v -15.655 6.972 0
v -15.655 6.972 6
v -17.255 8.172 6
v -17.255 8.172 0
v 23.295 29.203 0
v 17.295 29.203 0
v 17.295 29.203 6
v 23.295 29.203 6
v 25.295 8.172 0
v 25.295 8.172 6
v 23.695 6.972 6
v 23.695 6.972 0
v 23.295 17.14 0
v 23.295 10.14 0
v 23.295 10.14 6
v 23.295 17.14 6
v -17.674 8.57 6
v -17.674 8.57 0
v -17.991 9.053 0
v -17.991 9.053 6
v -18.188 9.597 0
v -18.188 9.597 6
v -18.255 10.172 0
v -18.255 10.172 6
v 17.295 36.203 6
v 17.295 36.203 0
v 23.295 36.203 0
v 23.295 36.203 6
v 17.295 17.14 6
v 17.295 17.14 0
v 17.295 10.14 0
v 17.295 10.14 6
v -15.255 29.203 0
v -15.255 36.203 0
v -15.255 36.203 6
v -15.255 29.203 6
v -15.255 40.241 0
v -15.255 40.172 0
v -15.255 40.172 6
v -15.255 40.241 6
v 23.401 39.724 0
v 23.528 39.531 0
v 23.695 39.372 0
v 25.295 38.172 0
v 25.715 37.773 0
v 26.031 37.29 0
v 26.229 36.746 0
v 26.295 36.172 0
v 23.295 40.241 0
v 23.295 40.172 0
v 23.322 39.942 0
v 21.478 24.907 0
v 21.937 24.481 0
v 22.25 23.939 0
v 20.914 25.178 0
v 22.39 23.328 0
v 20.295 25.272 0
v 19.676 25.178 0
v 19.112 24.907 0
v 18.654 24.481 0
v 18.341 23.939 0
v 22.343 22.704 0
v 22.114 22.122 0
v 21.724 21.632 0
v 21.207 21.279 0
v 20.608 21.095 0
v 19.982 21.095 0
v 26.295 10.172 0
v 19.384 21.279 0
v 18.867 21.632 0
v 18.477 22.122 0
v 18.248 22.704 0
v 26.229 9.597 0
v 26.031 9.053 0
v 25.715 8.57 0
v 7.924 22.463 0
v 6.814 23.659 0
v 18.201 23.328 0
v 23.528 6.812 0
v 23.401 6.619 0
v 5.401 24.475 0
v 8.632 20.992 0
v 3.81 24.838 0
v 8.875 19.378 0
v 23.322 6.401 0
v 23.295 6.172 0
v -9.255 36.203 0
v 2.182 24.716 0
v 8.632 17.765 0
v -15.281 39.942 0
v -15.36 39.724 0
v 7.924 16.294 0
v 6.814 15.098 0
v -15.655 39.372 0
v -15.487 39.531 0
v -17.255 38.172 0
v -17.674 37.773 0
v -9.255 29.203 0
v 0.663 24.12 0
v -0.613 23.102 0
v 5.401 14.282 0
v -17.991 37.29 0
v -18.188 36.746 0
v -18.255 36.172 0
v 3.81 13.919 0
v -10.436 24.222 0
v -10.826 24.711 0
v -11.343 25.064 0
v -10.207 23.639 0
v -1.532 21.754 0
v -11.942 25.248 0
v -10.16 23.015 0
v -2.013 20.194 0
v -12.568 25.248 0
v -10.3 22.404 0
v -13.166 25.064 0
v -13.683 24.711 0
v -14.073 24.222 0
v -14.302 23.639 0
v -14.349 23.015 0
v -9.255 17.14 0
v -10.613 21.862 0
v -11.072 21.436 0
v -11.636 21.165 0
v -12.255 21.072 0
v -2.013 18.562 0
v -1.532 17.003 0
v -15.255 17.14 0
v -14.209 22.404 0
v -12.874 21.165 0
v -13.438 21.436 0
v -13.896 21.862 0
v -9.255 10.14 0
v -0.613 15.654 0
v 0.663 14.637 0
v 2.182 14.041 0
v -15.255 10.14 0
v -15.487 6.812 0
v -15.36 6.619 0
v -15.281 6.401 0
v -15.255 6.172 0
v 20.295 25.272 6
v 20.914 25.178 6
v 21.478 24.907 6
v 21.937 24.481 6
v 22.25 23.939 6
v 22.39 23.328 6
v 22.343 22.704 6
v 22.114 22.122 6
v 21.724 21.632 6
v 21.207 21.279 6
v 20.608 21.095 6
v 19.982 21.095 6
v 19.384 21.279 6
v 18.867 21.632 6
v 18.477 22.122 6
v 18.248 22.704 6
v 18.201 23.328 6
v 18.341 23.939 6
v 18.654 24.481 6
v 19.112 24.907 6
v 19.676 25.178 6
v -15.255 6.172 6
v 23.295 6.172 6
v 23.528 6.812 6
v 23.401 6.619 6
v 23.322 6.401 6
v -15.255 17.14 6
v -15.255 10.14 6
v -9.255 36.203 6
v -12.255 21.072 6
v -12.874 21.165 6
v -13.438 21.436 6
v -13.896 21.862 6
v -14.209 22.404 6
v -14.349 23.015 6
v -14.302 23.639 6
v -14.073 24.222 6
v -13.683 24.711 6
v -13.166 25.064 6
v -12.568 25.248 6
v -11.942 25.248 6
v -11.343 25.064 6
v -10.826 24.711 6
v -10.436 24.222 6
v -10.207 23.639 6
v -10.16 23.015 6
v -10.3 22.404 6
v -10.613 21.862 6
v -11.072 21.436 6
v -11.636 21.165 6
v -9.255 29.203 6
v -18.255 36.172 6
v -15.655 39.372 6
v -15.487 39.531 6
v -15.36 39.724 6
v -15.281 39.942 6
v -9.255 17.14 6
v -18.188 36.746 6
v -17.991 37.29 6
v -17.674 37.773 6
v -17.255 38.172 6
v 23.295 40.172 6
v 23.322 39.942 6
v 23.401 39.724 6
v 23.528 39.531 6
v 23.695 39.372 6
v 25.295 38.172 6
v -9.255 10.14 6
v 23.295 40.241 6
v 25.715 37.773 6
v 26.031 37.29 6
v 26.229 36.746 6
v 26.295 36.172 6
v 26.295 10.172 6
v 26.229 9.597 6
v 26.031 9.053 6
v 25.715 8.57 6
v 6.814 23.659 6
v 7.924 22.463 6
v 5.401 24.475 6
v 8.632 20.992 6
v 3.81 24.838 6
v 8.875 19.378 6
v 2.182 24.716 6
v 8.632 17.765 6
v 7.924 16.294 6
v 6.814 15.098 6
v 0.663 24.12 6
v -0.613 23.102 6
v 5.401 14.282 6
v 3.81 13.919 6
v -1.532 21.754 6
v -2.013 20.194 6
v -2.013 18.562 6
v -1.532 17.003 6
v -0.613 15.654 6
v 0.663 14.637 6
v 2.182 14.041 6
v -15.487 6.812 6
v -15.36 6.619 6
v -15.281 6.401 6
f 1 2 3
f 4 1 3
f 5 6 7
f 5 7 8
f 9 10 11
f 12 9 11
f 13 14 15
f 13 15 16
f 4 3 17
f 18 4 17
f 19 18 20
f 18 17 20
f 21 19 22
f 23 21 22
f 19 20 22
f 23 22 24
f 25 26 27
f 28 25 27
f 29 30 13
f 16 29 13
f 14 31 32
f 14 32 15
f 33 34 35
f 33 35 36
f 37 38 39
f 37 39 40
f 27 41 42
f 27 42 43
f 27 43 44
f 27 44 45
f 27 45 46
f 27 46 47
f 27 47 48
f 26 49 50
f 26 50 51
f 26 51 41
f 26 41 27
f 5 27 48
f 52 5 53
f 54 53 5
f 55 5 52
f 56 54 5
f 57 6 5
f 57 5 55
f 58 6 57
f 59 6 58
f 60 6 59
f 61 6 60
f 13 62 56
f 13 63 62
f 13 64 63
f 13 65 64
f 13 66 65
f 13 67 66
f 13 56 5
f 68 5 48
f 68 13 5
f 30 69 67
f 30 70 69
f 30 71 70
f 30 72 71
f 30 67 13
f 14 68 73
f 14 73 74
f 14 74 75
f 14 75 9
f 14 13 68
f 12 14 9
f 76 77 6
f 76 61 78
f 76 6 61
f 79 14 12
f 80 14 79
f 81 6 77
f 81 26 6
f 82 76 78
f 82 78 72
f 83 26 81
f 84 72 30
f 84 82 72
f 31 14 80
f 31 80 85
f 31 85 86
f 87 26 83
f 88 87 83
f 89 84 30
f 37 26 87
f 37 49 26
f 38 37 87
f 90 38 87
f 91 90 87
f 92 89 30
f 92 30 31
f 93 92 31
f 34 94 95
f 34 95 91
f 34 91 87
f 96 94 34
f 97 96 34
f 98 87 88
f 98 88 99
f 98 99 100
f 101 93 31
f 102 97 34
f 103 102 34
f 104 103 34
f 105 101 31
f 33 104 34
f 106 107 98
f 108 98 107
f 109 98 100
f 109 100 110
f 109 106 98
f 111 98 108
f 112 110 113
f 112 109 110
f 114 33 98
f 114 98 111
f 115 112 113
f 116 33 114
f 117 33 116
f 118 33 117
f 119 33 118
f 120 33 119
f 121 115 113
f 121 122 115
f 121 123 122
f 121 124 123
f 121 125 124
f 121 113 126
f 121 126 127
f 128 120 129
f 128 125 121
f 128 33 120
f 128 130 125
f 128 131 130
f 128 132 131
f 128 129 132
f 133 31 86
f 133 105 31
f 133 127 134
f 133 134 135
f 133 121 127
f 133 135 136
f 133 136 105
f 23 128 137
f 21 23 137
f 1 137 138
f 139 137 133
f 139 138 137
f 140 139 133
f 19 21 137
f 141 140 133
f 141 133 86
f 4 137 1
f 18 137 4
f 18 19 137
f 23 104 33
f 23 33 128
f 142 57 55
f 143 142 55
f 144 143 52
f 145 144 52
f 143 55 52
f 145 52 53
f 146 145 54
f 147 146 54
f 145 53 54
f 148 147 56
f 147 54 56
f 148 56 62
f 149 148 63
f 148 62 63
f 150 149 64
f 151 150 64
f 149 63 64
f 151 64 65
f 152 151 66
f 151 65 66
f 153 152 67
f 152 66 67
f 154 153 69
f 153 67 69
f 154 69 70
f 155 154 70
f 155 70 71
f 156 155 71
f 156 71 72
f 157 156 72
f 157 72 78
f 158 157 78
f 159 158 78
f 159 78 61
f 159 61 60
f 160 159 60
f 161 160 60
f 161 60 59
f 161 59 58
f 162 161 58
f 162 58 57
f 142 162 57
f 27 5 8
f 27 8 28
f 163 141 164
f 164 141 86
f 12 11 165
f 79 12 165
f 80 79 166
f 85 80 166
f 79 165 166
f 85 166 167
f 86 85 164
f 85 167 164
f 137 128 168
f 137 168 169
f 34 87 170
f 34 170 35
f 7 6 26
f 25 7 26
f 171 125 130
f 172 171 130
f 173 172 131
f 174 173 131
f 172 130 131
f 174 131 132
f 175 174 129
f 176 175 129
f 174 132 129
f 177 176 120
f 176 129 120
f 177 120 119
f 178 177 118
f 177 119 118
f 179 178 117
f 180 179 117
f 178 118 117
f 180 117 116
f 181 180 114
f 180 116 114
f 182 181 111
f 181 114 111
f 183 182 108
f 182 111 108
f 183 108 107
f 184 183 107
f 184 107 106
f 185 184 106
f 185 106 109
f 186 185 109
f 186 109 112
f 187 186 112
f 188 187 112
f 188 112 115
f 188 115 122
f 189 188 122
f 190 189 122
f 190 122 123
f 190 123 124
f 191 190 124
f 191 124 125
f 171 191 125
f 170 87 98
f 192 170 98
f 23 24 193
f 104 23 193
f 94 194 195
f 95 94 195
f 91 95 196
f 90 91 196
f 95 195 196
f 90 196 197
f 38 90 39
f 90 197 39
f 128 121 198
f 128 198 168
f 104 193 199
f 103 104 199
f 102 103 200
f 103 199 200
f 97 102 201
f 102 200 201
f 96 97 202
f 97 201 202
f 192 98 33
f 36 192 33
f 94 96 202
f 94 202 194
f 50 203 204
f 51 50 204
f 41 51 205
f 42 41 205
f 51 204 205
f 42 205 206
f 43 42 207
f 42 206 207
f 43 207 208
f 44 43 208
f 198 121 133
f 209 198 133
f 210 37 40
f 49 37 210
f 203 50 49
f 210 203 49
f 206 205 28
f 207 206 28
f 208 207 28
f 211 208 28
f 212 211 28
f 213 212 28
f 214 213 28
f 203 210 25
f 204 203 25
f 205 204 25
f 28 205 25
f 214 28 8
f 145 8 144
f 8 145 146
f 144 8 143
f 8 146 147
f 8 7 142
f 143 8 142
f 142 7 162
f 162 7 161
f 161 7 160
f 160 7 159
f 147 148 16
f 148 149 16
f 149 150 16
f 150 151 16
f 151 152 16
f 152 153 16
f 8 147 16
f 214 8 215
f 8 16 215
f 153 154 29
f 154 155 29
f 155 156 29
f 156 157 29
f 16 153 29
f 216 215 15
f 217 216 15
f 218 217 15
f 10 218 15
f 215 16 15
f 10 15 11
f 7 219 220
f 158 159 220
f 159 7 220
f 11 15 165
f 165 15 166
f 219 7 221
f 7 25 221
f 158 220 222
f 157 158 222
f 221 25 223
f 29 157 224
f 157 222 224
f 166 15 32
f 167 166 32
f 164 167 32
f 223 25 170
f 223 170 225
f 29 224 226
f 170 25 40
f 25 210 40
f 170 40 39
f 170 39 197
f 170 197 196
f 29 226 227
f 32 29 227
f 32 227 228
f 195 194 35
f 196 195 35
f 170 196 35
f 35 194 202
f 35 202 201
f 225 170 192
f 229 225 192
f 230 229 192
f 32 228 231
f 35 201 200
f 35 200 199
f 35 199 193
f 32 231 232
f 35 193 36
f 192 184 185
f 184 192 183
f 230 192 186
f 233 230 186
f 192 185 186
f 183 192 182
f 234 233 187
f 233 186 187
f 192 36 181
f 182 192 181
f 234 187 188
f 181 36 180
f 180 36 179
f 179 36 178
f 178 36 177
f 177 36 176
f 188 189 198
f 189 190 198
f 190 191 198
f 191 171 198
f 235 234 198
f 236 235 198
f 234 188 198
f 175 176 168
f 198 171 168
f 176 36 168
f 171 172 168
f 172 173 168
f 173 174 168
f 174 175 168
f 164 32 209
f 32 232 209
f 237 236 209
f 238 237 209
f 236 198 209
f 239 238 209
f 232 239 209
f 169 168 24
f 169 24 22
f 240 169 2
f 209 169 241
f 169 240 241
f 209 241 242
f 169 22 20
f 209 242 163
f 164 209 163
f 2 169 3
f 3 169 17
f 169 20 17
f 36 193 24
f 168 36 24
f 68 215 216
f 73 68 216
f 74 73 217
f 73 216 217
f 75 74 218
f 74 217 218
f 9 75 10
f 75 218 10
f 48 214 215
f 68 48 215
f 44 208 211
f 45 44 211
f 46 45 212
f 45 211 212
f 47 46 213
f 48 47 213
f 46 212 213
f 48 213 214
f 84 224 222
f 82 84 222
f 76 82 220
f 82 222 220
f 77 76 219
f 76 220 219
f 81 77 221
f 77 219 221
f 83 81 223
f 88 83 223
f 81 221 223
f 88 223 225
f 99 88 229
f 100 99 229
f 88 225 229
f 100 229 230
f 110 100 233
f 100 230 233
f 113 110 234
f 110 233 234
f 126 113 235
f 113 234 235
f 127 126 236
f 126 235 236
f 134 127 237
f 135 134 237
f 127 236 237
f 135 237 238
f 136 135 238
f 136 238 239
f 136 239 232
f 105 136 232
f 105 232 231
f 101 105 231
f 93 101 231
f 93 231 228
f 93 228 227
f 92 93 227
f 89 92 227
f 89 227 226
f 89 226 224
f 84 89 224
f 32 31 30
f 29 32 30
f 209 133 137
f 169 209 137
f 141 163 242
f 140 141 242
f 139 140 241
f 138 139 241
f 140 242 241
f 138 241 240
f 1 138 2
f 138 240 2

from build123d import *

# Parameters (mm, degrees)
SKETCH_1_W           = 38.55
SKETCH_1_H           = 34.06926437
EXTRUDE_1_DEPTH      = 6
SKETCH_2_R           = 5.475
CUT_EXTRUDE_1_DEPTH  = 7
EXTRUDE_2_DEPTH      = 6
SKETCH_3_R           = 2.1
SKETCH_3_W           = 7
SKETCH_3_H           = 6
CUT_EXTRUDE_13_DEPTH = 7
EXTRUDE_21_DEPTH     = 6
SKETCH_31_R          = 2.1
SKETCH_31_W          = 7
SKETCH_31_H          = 6
CUT_EXTRUDE_14_DEPTH = 7


with BuildPart() as part:
    # Эскиз1 → Бобышка-Вытянуть1 (new body)
    with BuildSketch(Plane.XY):
        with Locations((4.02043073, 23.206158468)):
            Rectangle(SKETCH_1_W, SKETCH_1_H)
    extrude(amount=EXTRUDE_1_DEPTH)

    # Эскиз2 → Вырез-Вытянуть1 (cut, through all)
    with BuildSketch(Plane.XY.offset(6)):
        with Locations((3.40043073, 19.378379342)):
            Circle(SKETCH_2_R)
    extrude(amount=-CUT_EXTRUDE_1_DEPTH, mode=Mode.SUBTRACT)

    # Эскиз23 → Бобышка-Вытянуть2 (add)
    with BuildSketch(Plane(origin=(-26.70456927, 23.171526283, 6), x_dir=(0, 1, 0), z_dir=(0, 0, -1))):
        with BuildLine():
            Line((13, 53), (-13, 53))
            ThreePointArc((-13, 53), (-14.118033989, 52.736067977), (-15, 52))
            Line((-15, 52), (-16.2, 50.4))
            ThreePointArc((-16.2, 50.4), (-16.552786405, 50.105572809), (-17, 50))
            Line((-17, 50), (17, 50))
            ThreePointArc((17, 50), (16.552786405, 50.105572809), (16.2, 50.4))
            Line((16.2, 50.4), (15, 52))
            ThreePointArc((15, 52), (14.118033989, 52.736067977), (13, 53))
        make_face()
    extrude(amount=EXTRUDE_2_DEPTH)

    # Эскиз3 → Вырез-Вытянуть13 (cut, through all)
    with BuildSketch(Plane(origin=(-26.70456927, 23.171526283, 0), x_dir=(0, 1, 0), z_dir=(0, 0, -1))):
        with Locations((0, 47)):
            Circle(SKETCH_3_R)
        with Locations((9.531849908, 47)):
            Rectangle(SKETCH_3_W, SKETCH_3_H)
        with Locations((-9.531849908, 47)):
            Rectangle(SKETCH_3_W, SKETCH_3_H)
    extrude(amount=-CUT_EXTRUDE_13_DEPTH, mode=Mode.SUBTRACT)

    # Эскиз24 → Бобышка-Вытянуть21 (add)
    with BuildSketch(Plane(origin=(34.74543073, 23.171526283, 6), x_dir=(0, -1, 0), z_dir=(0, 0, -1))):
        with BuildLine():
            Line((13, 53), (-13, 53))
            ThreePointArc((-13, 53), (-14.118033989, 52.736067977), (-15, 52))
            Line((-15, 52), (-16.2, 50.4))
            ThreePointArc((-16.2, 50.4), (-16.552786405, 50.105572809), (-17, 50))
            Line((-17, 50), (17, 50))
            ThreePointArc((17, 50), (16.552786405, 50.105572809), (16.2, 50.4))
            Line((16.2, 50.4), (15, 52))
            ThreePointArc((15, 52), (14.118033989, 52.736067977), (13, 53))
        make_face()
    extrude(amount=EXTRUDE_21_DEPTH)

    # Эскиз31 → Вырез-Вытянуть14 (cut, through all)
    with BuildSketch(Plane(origin=(34.74543073, 23.171526283, 0), x_dir=(0, -1, 0), z_dir=(0, 0, -1))):
        with Locations((0, 47)):
            Circle(SKETCH_31_R)
        with Locations((9.531849908, 47)):
            Rectangle(SKETCH_31_W, SKETCH_31_H)
        with Locations((-9.531849908, 47)):
            Rectangle(SKETCH_31_W, SKETCH_31_H)
    extrude(amount=-CUT_EXTRUDE_14_DEPTH, mode=Mode.SUBTRACT)


solid = part.part
